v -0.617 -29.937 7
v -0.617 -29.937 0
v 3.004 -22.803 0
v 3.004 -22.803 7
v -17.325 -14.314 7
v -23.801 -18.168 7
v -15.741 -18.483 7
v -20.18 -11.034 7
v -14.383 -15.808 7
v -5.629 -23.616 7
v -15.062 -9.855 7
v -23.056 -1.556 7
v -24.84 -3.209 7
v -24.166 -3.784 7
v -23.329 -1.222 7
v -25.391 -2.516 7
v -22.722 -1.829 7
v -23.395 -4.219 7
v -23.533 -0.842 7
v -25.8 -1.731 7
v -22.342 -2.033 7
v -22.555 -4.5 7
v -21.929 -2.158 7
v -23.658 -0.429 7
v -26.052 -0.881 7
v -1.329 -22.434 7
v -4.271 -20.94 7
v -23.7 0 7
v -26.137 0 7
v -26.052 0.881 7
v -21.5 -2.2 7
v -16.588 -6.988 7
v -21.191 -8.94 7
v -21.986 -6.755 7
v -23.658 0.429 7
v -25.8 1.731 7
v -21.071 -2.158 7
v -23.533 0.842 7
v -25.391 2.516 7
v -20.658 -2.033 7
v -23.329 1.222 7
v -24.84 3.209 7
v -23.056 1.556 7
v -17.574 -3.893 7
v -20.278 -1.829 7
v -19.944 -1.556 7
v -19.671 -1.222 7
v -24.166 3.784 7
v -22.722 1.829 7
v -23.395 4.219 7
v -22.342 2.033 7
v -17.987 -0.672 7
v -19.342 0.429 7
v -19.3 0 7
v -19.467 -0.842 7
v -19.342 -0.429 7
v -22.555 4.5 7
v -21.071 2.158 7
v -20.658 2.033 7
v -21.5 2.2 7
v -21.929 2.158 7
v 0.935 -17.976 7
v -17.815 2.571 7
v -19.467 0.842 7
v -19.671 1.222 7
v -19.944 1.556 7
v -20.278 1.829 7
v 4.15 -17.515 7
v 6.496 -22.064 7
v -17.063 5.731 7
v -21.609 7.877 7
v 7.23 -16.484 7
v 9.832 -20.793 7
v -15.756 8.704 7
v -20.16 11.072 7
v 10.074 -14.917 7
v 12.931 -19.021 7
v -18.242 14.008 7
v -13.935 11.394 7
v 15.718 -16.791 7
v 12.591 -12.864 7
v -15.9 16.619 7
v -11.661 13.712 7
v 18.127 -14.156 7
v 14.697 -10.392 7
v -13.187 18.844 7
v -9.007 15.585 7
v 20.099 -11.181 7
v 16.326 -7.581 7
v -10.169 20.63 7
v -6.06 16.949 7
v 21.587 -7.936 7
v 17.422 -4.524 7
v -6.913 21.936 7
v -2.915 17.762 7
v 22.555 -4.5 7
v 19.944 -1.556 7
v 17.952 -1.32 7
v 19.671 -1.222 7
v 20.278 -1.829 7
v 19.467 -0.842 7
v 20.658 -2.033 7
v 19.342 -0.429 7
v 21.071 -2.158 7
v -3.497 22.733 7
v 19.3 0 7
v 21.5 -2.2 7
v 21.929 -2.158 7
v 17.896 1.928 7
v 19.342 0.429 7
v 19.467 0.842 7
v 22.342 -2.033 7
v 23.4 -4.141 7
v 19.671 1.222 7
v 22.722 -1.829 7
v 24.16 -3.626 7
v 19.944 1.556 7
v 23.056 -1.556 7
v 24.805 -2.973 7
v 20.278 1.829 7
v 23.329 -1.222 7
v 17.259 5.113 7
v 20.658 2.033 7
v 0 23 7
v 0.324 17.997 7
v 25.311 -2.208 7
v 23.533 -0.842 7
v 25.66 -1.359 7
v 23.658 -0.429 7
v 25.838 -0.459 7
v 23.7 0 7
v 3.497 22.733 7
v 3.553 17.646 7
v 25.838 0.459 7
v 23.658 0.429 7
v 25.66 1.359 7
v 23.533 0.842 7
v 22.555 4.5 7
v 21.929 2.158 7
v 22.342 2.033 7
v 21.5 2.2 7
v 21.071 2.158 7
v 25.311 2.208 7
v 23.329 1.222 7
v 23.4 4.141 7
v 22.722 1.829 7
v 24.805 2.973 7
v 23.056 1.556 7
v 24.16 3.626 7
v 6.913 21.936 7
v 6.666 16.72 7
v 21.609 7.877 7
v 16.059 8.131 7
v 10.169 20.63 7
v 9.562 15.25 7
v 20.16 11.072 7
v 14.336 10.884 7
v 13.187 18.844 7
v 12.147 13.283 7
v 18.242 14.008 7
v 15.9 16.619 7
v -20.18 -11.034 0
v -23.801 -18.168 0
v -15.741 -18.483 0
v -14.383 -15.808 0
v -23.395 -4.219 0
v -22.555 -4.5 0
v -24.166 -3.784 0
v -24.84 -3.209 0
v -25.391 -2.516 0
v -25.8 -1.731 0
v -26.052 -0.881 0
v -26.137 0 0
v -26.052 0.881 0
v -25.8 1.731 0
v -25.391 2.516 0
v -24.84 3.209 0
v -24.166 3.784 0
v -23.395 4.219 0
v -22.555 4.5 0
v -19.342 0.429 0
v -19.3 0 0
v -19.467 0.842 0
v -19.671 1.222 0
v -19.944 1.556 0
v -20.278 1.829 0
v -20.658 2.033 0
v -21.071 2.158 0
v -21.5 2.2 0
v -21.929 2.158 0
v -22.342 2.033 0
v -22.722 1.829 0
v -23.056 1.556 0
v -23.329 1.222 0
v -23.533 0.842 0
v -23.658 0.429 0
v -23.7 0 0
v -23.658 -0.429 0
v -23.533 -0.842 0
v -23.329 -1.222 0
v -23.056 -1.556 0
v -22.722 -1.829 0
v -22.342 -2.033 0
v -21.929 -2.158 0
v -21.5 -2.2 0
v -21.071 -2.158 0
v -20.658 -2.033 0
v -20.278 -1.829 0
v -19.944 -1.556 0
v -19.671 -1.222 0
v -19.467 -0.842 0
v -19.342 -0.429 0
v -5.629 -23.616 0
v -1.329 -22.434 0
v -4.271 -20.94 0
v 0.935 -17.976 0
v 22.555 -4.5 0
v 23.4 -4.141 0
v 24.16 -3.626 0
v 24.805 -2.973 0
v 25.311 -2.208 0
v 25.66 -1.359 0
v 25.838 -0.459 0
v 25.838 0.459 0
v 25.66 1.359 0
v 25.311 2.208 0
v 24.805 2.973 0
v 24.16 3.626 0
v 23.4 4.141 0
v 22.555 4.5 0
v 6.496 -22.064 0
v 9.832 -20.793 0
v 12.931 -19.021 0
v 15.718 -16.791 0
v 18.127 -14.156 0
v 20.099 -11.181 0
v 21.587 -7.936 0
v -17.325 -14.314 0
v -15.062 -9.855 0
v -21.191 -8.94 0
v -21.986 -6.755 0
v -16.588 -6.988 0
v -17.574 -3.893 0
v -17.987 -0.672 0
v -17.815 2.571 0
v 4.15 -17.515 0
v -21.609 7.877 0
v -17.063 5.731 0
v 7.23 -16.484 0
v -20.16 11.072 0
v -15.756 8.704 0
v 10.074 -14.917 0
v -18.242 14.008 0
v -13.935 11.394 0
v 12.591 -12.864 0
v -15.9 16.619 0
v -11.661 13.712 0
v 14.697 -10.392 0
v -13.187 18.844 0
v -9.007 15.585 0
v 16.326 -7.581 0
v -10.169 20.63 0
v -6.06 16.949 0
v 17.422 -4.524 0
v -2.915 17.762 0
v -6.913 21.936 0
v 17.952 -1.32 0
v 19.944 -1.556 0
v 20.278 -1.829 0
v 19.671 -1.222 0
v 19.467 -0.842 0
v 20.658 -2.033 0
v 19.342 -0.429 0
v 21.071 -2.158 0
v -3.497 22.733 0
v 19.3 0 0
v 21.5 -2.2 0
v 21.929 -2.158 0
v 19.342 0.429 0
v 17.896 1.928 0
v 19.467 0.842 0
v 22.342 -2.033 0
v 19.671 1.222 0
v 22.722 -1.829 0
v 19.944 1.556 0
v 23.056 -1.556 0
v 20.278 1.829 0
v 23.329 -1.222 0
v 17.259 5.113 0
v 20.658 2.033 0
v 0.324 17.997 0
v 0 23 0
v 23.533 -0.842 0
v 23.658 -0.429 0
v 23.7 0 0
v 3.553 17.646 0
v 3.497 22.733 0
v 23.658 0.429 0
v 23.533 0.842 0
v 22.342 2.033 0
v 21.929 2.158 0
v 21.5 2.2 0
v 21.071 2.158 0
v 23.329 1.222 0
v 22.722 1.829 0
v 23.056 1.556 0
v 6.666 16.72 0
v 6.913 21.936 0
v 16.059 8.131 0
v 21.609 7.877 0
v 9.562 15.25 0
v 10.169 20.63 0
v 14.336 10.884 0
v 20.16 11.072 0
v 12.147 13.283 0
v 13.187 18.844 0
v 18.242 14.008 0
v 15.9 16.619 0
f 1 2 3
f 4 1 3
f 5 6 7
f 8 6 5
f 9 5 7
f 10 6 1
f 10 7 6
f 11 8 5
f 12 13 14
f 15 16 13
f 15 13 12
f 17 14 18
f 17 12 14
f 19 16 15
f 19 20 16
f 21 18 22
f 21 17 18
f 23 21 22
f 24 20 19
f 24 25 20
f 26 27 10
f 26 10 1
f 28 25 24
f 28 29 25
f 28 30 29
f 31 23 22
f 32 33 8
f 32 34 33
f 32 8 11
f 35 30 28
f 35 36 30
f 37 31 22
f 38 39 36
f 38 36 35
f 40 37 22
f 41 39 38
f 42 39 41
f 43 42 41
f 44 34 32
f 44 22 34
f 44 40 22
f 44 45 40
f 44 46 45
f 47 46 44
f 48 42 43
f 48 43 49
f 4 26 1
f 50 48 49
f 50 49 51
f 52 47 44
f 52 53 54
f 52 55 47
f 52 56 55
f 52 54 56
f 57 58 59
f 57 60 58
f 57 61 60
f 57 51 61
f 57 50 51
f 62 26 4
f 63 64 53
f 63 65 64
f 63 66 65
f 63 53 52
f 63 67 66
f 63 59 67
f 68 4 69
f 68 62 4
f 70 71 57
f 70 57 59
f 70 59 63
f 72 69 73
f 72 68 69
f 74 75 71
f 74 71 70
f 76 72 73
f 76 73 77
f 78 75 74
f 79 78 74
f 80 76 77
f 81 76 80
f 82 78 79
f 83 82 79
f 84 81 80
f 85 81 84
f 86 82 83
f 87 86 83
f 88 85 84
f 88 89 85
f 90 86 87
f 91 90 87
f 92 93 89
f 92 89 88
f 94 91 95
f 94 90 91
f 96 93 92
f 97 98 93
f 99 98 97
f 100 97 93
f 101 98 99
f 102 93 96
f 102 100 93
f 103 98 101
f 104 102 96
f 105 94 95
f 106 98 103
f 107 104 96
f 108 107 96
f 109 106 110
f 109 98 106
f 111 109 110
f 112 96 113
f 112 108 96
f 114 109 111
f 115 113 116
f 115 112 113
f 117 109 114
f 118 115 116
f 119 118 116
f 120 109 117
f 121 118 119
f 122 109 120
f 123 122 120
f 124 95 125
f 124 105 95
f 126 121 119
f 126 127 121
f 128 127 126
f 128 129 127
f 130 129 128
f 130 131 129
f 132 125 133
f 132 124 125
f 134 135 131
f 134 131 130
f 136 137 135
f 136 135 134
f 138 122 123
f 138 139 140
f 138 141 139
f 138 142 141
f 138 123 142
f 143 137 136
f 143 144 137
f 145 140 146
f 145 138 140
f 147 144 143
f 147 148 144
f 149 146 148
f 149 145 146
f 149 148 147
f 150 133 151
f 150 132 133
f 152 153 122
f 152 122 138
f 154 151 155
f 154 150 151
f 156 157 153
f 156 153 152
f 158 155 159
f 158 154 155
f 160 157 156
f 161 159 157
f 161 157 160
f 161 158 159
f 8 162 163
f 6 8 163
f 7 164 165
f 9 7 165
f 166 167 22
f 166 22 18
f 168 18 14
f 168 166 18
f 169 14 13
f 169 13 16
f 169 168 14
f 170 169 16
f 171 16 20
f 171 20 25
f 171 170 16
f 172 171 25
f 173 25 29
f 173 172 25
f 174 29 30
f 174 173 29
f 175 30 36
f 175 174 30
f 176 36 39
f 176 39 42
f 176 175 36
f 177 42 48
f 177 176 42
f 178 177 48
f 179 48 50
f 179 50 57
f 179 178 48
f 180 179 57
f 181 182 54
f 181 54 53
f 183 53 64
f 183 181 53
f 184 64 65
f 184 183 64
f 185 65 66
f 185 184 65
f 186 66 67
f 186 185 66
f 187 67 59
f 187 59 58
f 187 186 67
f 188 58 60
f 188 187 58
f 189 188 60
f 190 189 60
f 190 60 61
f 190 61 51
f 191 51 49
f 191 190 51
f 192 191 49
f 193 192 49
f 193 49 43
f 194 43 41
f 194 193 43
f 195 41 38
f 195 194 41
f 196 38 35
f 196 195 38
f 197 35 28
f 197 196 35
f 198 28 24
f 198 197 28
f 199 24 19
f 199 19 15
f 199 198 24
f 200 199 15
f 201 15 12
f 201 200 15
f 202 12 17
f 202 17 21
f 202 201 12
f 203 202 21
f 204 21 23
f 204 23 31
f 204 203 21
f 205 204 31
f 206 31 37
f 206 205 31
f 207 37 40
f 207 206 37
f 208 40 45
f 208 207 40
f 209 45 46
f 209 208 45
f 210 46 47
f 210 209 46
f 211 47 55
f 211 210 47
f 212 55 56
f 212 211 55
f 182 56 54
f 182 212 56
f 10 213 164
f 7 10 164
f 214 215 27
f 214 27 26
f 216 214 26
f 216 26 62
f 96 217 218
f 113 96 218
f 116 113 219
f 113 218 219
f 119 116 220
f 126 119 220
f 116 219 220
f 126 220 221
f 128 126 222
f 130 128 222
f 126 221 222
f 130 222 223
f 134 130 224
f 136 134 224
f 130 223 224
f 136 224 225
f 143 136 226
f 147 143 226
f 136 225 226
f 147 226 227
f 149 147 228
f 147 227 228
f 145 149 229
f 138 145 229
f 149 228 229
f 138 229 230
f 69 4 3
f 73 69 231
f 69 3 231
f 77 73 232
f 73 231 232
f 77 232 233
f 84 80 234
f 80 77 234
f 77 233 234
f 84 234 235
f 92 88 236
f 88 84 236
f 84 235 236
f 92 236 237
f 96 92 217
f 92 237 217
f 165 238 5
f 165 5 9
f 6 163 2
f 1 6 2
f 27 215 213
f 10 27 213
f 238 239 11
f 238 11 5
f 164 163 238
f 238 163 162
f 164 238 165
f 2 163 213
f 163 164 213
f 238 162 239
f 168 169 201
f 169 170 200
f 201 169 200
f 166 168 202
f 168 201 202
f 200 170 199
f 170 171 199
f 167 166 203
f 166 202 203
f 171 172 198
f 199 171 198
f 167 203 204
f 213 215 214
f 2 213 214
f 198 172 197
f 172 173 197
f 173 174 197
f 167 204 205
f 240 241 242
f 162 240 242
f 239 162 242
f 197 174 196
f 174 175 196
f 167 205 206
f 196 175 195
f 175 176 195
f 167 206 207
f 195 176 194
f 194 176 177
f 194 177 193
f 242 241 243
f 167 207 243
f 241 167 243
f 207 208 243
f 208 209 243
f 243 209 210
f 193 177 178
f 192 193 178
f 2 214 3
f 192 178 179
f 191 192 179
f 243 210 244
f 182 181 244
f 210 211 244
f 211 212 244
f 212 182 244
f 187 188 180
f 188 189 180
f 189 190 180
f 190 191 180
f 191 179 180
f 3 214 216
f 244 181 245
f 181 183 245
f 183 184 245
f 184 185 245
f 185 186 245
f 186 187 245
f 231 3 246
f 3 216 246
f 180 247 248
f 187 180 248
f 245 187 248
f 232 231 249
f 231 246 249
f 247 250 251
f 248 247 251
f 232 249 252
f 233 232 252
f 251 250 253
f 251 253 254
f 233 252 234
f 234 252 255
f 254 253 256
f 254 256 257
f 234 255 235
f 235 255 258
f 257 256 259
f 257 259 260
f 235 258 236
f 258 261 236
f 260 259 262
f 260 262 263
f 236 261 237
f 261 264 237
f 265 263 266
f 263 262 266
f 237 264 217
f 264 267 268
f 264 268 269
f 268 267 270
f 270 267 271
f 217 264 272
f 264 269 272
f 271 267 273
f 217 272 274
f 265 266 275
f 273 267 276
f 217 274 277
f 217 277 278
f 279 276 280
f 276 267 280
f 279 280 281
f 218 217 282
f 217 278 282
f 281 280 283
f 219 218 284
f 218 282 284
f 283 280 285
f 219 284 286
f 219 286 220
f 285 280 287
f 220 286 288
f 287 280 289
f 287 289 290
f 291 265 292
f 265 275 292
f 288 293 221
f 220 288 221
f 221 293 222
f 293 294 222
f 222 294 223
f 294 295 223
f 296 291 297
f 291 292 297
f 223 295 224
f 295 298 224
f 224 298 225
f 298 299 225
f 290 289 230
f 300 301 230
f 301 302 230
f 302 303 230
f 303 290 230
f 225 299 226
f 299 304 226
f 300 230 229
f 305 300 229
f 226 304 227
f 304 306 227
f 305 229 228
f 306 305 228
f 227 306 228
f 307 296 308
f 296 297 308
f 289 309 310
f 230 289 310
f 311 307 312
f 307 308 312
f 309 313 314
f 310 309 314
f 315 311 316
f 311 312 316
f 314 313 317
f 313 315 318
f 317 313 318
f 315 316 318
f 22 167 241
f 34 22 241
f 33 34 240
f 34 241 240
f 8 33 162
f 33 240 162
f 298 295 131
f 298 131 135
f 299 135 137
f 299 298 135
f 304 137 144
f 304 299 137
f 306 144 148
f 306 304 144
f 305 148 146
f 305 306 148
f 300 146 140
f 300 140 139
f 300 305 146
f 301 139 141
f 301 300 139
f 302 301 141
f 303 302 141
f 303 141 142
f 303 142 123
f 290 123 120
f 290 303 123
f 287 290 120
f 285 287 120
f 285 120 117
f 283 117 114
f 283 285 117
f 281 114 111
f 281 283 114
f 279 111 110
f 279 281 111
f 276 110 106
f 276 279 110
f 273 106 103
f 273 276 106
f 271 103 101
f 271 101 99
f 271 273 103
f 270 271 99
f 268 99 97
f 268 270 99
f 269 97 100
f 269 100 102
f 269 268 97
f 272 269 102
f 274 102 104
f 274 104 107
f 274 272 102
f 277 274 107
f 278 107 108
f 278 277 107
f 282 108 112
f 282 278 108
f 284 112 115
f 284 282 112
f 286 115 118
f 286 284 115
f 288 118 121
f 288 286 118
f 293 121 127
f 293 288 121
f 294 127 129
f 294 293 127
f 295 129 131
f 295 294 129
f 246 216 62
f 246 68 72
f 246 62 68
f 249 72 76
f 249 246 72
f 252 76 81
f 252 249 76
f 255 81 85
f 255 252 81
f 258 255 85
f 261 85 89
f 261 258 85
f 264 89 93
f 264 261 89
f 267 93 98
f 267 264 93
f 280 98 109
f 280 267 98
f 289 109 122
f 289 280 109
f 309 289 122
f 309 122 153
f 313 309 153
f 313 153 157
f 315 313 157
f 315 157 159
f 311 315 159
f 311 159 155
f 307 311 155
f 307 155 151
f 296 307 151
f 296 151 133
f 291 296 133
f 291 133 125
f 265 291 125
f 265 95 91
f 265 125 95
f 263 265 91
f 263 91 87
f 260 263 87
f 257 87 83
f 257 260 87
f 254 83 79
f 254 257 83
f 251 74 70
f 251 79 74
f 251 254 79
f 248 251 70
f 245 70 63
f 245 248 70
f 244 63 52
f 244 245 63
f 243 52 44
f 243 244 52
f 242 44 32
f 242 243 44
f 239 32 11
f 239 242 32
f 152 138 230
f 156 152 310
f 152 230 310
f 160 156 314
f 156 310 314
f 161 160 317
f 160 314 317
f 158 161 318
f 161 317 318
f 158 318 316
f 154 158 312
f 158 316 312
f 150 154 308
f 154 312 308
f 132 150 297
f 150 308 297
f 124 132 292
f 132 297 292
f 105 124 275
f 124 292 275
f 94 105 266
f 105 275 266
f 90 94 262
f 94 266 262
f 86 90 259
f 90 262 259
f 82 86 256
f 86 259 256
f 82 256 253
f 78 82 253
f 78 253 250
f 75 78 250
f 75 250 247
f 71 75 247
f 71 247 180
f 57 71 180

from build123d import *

# Parameters (mm, degrees)
SKETCH1_R           = 23
SKETCH1_R_2         = 18
BOSS_EXTRUDE1_DEPTH = 7
BOSS_EXTRUDE2_DEPTH = 7
CUT_EXTRUDE1_DEPTH  = 7
BOSS_EXTRUDE3_DEPTH = 7
SKETCH7_R           = 2.2
CUT_EXTRUDE2_DEPTH  = 7
CUT_EXTRUDE3_DEPTH  = 7


with BuildPart() as part:
    # Sketch1 → Boss-Extrude1 (new body)
    with BuildSketch(Plane.XY):
        Circle(SKETCH1_R)
        Circle(SKETCH1_R_2, mode=Mode.SUBTRACT)
    extrude(amount=BOSS_EXTRUDE1_DEPTH)

    # Sketch3 → Boss-Extrude2 (add)
    with BuildSketch(Plane.XY):
        with BuildLine():
            Line((-23.80139919, -18.167885182), (-0.617388595, -29.936557696))
            Line((-0.617388595, -29.936557696), (3.003741409, -22.803015975))
            ThreePointArc((3.003741409, -22.803015975), (-10.410748762, -20.508932449), (-20.180269185, -11.034343461))
            Line((-20.180269185, -11.034343461), (-23.80139919, -18.167885182))
        make_face()
    extrude(amount=BOSS_EXTRUDE2_DEPTH)

    # Sketch5 → Cut-Extrude1 (cut)
    with BuildSketch(Plane.XY):
        with BuildLine():
            Line((-15.062285021, -9.855332057), (-17.325491273, -14.313795633))
            Line((-17.325491273, -14.313795633), (-1.328523963, -22.434179668))
            Line((-1.328523963, -22.434179668), (0.93468229, -17.975716092))
            ThreePointArc((0.93468229, -17.975716092), (-8.14754251, -16.050468873), (-15.062285021, -9.855332057))
        make_face()
    extrude(amount=CUT_EXTRUDE1_DEPTH, mode=Mode.SUBTRACT)

    # Sketch6 → Boss-Extrude3 (add)
    with BuildSketch(Plane.XY):
        with BuildLine():
            ThreePointArc((-22.555487137, -4.5), (-26.136916399, 0), (-22.555487137, 4.5))
            ThreePointArc((-22.555487137, 4.5), (-23, 0), (-22.555487137, -4.5))
        make_face()
        with BuildLine():
            ThreePointArc((22.555487137, -4.5), (25.860234666, 0), (22.555487137, 4.5))
            ThreePointArc((22.555487137, 4.5), (23, 0), (22.555487137, -4.5))
        make_face()
    extrude(amount=BOSS_EXTRUDE3_DEPTH)

    # Sketch7 → Cut-Extrude2 (cut)
    with BuildSketch(Plane.XY):
        with Locations((-21.5, 0)):
            Circle(SKETCH7_R)
        with Locations((21.5, 0)):
            Circle(SKETCH7_R)
    extrude(amount=CUT_EXTRUDE2_DEPTH, mode=Mode.SUBTRACT)

    # Sketch8 → Cut-Extrude3 (cut)
    with BuildSketch(Plane.XY):
        Polygon((-14.382905313, -15.80751176), (-4.271109923, -20.940463541), (-5.629033675, -23.615541687), (-15.740829065, -18.482589905), align=None)
    extrude(amount=CUT_EXTRUDE3_DEPTH, mode=Mode.SUBTRACT)


solid = part.part
